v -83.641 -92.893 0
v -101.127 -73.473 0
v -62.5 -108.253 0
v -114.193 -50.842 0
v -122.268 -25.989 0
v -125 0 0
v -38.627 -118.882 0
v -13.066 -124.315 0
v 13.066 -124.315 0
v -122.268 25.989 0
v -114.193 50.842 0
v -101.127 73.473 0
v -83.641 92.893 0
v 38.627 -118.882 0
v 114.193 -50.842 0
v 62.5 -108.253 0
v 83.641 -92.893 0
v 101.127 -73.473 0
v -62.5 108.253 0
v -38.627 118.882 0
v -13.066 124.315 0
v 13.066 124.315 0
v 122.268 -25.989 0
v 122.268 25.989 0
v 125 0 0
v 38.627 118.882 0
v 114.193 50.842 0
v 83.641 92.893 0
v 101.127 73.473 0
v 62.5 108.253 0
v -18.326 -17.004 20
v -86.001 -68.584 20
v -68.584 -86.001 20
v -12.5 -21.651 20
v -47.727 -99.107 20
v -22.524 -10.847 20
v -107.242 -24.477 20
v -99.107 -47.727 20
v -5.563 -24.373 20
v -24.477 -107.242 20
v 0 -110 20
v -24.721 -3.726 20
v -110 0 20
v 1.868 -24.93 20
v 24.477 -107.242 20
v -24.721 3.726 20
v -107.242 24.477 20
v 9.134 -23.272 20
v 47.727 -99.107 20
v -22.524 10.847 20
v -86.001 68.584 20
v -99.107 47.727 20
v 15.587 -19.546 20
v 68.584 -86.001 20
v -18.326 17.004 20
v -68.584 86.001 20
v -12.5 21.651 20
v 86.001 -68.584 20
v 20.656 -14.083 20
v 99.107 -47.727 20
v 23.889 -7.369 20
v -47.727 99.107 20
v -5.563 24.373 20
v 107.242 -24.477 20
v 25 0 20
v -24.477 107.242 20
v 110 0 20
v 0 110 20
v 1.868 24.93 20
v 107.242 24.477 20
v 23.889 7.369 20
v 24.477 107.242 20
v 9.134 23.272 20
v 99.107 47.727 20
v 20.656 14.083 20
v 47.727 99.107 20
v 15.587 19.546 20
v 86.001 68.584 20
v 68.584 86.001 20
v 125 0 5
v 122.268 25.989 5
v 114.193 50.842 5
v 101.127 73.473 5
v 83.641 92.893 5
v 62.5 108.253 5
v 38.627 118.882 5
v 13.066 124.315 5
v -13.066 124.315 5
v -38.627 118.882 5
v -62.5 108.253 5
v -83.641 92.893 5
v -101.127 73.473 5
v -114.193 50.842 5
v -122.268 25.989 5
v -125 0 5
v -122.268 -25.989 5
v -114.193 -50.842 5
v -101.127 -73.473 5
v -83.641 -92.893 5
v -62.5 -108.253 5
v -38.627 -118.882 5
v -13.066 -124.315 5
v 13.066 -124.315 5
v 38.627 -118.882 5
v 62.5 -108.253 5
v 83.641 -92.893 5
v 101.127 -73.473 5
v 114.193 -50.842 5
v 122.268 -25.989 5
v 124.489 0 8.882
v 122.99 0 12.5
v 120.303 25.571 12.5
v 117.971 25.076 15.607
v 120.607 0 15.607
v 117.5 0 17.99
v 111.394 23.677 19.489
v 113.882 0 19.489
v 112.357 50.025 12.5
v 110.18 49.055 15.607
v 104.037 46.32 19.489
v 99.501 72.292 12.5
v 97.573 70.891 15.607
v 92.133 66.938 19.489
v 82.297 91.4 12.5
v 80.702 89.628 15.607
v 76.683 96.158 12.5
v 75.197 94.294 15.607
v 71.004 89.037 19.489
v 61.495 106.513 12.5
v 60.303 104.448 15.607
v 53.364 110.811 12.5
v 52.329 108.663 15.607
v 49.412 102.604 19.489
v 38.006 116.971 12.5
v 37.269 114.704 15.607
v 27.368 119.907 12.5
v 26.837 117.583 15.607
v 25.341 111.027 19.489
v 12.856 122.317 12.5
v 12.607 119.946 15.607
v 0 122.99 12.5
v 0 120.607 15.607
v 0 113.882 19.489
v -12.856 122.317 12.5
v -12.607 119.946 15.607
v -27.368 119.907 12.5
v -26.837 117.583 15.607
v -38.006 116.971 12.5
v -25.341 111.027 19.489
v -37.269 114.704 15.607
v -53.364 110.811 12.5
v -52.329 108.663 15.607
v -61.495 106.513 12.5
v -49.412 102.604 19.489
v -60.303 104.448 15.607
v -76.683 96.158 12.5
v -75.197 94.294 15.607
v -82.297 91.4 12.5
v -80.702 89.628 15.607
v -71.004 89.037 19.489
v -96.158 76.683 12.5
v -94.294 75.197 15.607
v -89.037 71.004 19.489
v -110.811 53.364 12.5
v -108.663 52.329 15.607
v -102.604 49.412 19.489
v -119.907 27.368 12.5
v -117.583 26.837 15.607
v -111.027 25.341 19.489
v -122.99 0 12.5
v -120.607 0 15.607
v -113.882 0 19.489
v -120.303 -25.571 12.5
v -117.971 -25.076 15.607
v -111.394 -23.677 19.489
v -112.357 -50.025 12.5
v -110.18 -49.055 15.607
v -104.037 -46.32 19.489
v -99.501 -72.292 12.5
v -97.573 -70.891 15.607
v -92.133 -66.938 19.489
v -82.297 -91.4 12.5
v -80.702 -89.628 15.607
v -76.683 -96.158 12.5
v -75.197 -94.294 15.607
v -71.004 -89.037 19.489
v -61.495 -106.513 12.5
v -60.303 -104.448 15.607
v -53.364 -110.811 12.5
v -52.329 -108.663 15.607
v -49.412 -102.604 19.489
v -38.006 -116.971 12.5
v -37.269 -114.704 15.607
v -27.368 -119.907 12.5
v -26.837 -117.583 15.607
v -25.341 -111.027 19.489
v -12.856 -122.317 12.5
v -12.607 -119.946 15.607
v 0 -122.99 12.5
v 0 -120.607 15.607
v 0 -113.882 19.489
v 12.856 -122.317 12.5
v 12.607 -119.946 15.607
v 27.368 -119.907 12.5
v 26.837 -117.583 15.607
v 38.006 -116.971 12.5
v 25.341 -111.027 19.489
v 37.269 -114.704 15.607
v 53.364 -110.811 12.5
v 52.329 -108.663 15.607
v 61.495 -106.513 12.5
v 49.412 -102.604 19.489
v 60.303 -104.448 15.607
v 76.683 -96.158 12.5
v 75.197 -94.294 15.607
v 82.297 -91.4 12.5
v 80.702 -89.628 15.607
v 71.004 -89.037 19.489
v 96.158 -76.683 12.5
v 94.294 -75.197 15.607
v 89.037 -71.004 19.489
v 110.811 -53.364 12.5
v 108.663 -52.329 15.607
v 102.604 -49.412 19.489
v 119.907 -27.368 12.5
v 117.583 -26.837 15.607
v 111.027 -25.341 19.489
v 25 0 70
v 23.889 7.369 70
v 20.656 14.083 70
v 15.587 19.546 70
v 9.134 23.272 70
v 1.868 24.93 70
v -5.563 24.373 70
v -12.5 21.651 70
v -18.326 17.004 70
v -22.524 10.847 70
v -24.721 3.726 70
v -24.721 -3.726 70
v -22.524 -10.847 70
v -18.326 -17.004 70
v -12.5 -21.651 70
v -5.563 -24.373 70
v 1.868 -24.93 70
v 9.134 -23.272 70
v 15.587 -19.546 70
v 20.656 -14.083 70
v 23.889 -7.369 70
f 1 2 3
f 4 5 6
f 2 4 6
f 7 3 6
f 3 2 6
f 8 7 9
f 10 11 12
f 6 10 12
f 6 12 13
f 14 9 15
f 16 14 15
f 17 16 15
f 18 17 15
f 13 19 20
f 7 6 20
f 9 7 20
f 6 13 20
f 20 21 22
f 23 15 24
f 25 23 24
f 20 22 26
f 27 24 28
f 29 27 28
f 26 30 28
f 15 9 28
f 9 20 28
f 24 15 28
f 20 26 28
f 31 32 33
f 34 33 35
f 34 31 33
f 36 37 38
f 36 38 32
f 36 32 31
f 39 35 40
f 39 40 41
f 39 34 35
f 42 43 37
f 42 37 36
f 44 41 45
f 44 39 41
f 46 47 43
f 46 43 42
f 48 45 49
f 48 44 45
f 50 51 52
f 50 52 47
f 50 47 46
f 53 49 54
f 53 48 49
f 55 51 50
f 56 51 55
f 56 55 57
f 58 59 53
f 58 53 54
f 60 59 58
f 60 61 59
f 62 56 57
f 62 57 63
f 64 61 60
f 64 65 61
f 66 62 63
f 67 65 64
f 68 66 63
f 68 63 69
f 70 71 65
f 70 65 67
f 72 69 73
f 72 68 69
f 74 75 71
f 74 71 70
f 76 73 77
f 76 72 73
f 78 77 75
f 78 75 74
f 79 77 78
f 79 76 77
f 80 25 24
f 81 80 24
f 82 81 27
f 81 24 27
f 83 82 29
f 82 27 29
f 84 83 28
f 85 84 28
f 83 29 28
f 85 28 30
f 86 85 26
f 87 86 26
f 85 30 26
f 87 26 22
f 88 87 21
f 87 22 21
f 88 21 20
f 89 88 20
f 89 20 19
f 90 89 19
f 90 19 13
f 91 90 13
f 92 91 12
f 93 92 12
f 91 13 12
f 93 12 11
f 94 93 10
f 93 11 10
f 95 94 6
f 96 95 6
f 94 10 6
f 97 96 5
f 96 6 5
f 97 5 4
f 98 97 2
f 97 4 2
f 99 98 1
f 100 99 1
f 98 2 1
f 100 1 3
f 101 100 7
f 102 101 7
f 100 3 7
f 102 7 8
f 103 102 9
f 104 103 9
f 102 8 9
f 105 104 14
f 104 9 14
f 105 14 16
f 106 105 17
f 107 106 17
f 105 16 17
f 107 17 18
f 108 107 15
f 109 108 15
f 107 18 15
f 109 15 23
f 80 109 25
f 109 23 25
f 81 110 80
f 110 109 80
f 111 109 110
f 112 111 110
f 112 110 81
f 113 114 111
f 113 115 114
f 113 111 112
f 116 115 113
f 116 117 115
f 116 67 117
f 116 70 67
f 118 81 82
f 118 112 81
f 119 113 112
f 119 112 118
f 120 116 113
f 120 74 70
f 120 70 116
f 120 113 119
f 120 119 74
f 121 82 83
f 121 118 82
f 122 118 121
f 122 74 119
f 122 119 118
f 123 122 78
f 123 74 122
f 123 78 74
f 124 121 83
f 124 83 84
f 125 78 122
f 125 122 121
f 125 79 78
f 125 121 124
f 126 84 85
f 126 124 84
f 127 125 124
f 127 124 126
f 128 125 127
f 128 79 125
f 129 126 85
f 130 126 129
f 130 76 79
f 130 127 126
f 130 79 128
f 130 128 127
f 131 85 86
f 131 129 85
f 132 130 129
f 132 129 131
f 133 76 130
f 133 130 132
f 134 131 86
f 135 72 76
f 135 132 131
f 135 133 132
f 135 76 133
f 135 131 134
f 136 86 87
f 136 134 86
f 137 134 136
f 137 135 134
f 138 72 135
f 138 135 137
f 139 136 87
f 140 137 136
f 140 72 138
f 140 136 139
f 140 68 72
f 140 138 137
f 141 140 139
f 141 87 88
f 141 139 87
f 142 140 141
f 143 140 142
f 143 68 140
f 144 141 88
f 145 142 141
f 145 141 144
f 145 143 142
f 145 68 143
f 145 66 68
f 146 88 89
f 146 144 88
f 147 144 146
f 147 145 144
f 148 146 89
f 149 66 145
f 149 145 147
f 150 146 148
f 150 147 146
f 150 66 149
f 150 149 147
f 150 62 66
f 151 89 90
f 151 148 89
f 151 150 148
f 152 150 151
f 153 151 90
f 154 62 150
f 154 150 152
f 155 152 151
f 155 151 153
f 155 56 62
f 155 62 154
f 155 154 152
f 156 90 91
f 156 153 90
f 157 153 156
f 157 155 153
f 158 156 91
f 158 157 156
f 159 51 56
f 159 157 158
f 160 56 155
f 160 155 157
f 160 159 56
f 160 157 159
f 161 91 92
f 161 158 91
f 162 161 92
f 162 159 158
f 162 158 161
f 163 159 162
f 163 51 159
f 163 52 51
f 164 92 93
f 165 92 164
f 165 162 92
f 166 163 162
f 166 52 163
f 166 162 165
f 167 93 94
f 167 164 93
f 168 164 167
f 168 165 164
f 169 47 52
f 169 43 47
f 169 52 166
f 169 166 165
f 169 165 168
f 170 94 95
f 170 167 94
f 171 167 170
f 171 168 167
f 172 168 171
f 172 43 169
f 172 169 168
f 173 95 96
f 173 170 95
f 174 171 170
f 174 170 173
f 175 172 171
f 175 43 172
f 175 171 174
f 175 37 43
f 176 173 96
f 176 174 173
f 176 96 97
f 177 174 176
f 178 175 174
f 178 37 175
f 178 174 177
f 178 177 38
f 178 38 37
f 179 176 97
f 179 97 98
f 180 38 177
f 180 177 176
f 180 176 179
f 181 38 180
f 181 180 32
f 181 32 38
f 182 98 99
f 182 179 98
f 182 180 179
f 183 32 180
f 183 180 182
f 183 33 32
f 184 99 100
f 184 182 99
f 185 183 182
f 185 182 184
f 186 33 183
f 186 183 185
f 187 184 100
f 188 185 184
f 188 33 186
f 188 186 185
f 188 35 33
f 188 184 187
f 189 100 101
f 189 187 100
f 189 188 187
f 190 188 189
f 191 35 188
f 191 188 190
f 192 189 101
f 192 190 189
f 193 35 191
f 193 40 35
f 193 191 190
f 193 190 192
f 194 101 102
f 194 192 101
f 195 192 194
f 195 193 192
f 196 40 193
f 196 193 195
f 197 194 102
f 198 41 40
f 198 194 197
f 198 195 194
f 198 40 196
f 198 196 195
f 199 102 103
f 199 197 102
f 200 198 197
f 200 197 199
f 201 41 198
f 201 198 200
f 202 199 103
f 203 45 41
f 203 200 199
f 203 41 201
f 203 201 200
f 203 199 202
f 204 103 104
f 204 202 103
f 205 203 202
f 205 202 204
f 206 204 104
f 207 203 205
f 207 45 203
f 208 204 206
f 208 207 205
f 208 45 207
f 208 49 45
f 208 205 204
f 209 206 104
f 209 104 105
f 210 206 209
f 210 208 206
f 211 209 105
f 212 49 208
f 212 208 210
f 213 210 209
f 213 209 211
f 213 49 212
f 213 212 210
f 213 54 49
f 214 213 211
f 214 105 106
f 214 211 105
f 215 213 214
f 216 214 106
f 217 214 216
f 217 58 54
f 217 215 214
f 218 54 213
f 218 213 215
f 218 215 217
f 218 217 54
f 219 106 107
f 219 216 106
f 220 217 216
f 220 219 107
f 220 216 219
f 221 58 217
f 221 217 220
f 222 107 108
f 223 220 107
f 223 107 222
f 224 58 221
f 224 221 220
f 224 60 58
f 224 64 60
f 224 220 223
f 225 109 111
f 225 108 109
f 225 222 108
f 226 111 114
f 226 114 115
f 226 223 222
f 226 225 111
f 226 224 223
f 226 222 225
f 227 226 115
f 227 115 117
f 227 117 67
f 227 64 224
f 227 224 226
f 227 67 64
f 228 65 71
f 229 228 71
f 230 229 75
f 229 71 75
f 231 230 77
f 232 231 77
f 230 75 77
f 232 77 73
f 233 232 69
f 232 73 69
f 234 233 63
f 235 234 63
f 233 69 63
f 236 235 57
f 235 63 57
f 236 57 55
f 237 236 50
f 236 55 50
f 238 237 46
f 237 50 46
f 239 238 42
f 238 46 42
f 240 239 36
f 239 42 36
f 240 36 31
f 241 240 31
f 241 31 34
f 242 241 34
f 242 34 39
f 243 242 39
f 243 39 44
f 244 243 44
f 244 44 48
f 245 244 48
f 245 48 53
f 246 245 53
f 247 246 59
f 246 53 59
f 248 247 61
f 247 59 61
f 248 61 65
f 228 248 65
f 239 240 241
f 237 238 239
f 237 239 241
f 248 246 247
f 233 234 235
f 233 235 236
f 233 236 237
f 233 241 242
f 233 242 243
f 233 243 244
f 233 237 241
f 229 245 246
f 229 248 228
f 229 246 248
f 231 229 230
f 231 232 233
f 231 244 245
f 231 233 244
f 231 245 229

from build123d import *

# Parameters (mm, degrees)
SKETCH_R     = 125
PAD_DEPTH    = 20
SKETCH001_R  = 25
PAD001_DEPTH = 50
FILLET006_R  = 15


with BuildPart() as part:
    # Sketch → Pad (new body)
    with BuildSketch(Plane.XY):
        Circle(SKETCH_R)
    extrude(amount=PAD_DEPTH)

    # Sketch001 (on Face3 of Pad) → Pad001 (join)
    with BuildSketch(Plane.XY.offset(20)):
        Circle(SKETCH001_R)
    extrude(amount=PAD001_DEPTH)

    # Fillet006
    fillet006_edges = [part.edges().sort_by_distance(p)[0] for p in [
        (-125, 0, 20),
    ]]
    fillet(fillet006_edges, radius=FILLET006_R)


solid = part.part
